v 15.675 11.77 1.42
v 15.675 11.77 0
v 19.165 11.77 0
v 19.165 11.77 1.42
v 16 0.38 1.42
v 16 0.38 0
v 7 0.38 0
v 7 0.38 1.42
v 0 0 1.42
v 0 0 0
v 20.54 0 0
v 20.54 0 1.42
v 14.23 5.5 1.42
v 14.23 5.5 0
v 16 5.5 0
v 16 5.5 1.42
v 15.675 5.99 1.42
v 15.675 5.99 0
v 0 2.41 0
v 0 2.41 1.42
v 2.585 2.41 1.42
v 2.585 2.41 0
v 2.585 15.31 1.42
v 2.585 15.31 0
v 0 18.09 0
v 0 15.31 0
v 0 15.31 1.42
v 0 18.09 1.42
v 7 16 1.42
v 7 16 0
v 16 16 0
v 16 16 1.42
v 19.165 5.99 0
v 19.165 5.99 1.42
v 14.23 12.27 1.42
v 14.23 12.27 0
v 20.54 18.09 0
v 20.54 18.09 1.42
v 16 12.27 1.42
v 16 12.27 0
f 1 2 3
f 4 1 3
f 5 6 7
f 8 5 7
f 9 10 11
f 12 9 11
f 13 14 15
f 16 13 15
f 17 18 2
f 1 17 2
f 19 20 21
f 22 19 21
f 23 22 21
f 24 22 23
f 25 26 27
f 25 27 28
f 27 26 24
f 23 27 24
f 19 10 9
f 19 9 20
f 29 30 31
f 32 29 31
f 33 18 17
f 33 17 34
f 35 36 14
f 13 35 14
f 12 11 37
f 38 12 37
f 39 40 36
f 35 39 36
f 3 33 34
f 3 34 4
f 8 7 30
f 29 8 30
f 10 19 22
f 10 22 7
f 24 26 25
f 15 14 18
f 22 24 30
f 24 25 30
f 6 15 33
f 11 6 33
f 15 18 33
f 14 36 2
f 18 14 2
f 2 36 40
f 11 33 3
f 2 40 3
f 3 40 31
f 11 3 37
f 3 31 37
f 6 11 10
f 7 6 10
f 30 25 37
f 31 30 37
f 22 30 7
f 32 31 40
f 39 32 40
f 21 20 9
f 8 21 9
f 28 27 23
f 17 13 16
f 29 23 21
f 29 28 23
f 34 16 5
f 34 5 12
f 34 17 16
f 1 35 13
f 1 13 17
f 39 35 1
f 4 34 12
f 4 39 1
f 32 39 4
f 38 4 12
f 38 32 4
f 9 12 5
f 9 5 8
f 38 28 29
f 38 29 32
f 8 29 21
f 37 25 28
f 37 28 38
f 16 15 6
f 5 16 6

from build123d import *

# Parameters (mm, degrees)
F0_W     = 20.54
F0_H     = 18.09
F0_W_2   = 2.57
F0_H_2   = 12.9
F0_W_3   = 3.49
F0_H_3   = 5.78
F1_DEPTH = 1.42
F2_W     = 0.015
F2_H     = 12.9
F3_DEPTH = 1.421


with BuildPart() as f1:
    # F0 (on Top) → F1 (new body)
    with BuildSketch(Plane.XY):
        with Locations((10.27, 9.045)):
            Rectangle(F0_W, F0_H)
        with Locations((1.3, 8.86)):
            Rectangle(F0_W_2, F0_H_2, mode=Mode.SUBTRACT)
        Polygon((7, 0.38), (7, 16), (16, 16), (16, 12.27), (14.23, 12.27), (14.23, 5.5), (16, 5.5), (16, 0.38), align=None, mode=Mode.SUBTRACT)
        with Locations((17.42, 8.88)):
            Rectangle(F0_W_3, F0_H_3, mode=Mode.SUBTRACT)
    extrude(amount=F1_DEPTH)

    # F2 (on face) → F3 (cut, through all)
    with BuildSketch(Plane.XY.offset(1.42)):
        with Locations((0.0075, 8.86)):
            Rectangle(F2_W, F2_H)
    extrude(amount=-F3_DEPTH, mode=Mode.SUBTRACT)


solid = f1.part
